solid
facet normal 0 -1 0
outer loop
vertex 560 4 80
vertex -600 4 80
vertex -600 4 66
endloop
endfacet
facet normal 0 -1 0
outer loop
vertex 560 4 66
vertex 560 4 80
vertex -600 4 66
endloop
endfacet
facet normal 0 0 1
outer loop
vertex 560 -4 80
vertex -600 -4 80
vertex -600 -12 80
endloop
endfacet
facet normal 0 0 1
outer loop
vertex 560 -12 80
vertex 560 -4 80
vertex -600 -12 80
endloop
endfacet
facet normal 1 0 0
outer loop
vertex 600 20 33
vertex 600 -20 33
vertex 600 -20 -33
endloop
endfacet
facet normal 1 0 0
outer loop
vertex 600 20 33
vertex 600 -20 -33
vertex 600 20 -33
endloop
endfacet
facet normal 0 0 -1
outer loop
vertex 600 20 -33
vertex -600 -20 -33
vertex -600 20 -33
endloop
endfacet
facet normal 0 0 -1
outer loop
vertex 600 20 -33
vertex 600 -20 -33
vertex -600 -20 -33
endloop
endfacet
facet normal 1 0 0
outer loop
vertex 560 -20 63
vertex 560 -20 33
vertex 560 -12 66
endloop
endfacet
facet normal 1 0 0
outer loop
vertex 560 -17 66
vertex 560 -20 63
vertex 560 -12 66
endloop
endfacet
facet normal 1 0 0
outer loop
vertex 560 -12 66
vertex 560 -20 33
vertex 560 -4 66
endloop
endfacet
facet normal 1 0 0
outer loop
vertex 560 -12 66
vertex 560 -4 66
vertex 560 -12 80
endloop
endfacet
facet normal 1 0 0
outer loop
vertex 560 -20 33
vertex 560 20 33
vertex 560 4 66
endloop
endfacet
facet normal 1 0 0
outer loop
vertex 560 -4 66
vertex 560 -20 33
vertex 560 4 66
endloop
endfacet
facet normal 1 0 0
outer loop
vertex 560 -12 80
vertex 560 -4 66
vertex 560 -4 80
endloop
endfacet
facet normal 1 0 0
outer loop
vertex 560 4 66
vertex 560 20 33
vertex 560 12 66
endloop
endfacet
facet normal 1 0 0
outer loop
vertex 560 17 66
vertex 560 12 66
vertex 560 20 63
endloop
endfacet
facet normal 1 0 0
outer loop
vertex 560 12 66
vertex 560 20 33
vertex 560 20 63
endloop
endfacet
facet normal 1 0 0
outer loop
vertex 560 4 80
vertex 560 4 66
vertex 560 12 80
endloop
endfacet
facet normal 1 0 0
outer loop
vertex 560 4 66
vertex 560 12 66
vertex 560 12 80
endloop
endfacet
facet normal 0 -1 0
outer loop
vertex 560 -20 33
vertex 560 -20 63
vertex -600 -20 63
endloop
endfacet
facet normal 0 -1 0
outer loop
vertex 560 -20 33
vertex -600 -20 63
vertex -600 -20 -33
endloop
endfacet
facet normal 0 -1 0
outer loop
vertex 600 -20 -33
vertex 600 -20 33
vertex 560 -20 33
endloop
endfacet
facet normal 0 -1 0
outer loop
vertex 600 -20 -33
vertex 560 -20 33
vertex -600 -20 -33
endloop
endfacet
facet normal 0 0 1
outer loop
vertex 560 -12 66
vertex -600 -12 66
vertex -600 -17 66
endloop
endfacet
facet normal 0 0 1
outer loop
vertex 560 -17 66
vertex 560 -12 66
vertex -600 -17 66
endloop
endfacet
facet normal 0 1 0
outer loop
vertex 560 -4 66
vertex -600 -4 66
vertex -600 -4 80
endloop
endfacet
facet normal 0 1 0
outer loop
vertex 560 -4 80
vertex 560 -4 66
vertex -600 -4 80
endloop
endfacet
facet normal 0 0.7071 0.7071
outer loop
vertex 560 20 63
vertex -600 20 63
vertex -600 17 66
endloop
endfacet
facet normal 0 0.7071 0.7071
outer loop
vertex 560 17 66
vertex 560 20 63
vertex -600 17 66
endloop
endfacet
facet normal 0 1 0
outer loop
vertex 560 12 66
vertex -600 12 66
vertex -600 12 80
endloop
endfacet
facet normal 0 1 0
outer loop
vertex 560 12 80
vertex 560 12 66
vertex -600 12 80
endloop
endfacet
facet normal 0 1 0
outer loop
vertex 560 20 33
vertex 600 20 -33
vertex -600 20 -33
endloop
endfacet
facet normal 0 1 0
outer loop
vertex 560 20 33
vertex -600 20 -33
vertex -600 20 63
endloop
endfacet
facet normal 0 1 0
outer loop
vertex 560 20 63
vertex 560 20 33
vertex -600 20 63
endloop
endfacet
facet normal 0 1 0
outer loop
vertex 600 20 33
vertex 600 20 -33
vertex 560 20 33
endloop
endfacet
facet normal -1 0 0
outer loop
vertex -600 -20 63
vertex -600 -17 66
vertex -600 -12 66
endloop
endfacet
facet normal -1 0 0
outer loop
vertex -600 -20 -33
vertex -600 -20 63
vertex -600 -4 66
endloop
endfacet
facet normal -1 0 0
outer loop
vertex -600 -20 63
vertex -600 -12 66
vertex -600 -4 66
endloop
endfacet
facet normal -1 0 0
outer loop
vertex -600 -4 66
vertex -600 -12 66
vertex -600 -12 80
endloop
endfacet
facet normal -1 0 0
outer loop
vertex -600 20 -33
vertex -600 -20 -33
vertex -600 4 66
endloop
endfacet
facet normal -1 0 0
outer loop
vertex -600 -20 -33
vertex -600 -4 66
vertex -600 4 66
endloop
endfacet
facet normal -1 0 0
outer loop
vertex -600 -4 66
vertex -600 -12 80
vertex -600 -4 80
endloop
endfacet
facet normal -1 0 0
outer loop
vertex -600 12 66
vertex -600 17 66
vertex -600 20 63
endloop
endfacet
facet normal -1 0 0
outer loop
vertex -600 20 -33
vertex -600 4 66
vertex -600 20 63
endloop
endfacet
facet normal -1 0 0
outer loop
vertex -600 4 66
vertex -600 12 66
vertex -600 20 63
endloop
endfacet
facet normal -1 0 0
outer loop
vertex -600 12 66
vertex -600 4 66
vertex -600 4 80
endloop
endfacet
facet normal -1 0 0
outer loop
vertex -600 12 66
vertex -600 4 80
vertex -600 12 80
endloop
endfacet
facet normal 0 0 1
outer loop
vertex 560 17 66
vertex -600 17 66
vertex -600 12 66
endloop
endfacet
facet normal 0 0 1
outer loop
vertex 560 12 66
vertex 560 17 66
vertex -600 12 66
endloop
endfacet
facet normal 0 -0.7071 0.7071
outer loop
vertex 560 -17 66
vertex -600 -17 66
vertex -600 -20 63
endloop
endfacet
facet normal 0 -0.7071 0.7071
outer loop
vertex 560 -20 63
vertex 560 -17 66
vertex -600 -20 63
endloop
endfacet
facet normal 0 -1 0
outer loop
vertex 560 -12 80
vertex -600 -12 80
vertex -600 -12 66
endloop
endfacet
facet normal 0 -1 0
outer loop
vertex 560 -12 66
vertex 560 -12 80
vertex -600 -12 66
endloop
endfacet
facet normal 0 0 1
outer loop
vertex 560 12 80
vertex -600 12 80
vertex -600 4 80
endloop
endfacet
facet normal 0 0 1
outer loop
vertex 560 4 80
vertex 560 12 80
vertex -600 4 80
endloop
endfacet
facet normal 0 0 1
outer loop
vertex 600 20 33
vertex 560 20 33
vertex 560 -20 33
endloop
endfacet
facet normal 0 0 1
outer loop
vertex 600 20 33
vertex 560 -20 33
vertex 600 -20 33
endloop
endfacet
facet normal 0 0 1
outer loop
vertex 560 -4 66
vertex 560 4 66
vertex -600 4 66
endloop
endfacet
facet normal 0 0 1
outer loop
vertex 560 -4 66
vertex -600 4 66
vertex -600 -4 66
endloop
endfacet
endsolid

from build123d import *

# Parameters (mm, degrees)
F1_W     = 40
F1_H     = 33
F3_DEPTH = 600
F2_W     = 80
F2_H     = 100
F4_DEPTH = 25
F5_W     = 1200
F5_H     = 50
F6_DEPTH = 1235


# Not quite as in the source:
# - an extrude ends at something that could not be found from the text; its depth is read off the source's solid


with BuildPart() as f3:
    # F1 (on Right) → F3 (new body, symmetric)
    with BuildSketch(Plane.YZ):
        Polygon((20, 33), (20, 63), (17, 66), (12, 66), (12, 80), (4, 80), (4, 66), (-4, 66), (-4, 80), (-12, 80), (-12, 66), (-17, 66), (-20, 63), (-20, 33), align=None)
        with Locations((0, 16.5)):
            Rectangle(F1_W, F1_H)
        with Locations((0, -16.5)):
            Rectangle(F1_W, F1_H)
    extrude(amount=F3_DEPTH, both=True)

    # F2 (on Front) → F4 (cut, symmetric)
    with BuildSketch(Plane.XZ):
        with Locations((600, 83)):
            Rectangle(F2_W, F2_H)
        with Locations((600, -83)):
            Rectangle(F2_W, F2_H)
    extrude(amount=F4_DEPTH, both=True, mode=Mode.SUBTRACT)

    # F5 (on face) → F6 (cut, through all)
    with BuildSketch(Plane.XZ.offset(20)):
        with Locations((0, -58)):
            Rectangle(F5_W, F5_H)
    extrude(amount=-F6_DEPTH, mode=Mode.SUBTRACT)


solid = f3.part
